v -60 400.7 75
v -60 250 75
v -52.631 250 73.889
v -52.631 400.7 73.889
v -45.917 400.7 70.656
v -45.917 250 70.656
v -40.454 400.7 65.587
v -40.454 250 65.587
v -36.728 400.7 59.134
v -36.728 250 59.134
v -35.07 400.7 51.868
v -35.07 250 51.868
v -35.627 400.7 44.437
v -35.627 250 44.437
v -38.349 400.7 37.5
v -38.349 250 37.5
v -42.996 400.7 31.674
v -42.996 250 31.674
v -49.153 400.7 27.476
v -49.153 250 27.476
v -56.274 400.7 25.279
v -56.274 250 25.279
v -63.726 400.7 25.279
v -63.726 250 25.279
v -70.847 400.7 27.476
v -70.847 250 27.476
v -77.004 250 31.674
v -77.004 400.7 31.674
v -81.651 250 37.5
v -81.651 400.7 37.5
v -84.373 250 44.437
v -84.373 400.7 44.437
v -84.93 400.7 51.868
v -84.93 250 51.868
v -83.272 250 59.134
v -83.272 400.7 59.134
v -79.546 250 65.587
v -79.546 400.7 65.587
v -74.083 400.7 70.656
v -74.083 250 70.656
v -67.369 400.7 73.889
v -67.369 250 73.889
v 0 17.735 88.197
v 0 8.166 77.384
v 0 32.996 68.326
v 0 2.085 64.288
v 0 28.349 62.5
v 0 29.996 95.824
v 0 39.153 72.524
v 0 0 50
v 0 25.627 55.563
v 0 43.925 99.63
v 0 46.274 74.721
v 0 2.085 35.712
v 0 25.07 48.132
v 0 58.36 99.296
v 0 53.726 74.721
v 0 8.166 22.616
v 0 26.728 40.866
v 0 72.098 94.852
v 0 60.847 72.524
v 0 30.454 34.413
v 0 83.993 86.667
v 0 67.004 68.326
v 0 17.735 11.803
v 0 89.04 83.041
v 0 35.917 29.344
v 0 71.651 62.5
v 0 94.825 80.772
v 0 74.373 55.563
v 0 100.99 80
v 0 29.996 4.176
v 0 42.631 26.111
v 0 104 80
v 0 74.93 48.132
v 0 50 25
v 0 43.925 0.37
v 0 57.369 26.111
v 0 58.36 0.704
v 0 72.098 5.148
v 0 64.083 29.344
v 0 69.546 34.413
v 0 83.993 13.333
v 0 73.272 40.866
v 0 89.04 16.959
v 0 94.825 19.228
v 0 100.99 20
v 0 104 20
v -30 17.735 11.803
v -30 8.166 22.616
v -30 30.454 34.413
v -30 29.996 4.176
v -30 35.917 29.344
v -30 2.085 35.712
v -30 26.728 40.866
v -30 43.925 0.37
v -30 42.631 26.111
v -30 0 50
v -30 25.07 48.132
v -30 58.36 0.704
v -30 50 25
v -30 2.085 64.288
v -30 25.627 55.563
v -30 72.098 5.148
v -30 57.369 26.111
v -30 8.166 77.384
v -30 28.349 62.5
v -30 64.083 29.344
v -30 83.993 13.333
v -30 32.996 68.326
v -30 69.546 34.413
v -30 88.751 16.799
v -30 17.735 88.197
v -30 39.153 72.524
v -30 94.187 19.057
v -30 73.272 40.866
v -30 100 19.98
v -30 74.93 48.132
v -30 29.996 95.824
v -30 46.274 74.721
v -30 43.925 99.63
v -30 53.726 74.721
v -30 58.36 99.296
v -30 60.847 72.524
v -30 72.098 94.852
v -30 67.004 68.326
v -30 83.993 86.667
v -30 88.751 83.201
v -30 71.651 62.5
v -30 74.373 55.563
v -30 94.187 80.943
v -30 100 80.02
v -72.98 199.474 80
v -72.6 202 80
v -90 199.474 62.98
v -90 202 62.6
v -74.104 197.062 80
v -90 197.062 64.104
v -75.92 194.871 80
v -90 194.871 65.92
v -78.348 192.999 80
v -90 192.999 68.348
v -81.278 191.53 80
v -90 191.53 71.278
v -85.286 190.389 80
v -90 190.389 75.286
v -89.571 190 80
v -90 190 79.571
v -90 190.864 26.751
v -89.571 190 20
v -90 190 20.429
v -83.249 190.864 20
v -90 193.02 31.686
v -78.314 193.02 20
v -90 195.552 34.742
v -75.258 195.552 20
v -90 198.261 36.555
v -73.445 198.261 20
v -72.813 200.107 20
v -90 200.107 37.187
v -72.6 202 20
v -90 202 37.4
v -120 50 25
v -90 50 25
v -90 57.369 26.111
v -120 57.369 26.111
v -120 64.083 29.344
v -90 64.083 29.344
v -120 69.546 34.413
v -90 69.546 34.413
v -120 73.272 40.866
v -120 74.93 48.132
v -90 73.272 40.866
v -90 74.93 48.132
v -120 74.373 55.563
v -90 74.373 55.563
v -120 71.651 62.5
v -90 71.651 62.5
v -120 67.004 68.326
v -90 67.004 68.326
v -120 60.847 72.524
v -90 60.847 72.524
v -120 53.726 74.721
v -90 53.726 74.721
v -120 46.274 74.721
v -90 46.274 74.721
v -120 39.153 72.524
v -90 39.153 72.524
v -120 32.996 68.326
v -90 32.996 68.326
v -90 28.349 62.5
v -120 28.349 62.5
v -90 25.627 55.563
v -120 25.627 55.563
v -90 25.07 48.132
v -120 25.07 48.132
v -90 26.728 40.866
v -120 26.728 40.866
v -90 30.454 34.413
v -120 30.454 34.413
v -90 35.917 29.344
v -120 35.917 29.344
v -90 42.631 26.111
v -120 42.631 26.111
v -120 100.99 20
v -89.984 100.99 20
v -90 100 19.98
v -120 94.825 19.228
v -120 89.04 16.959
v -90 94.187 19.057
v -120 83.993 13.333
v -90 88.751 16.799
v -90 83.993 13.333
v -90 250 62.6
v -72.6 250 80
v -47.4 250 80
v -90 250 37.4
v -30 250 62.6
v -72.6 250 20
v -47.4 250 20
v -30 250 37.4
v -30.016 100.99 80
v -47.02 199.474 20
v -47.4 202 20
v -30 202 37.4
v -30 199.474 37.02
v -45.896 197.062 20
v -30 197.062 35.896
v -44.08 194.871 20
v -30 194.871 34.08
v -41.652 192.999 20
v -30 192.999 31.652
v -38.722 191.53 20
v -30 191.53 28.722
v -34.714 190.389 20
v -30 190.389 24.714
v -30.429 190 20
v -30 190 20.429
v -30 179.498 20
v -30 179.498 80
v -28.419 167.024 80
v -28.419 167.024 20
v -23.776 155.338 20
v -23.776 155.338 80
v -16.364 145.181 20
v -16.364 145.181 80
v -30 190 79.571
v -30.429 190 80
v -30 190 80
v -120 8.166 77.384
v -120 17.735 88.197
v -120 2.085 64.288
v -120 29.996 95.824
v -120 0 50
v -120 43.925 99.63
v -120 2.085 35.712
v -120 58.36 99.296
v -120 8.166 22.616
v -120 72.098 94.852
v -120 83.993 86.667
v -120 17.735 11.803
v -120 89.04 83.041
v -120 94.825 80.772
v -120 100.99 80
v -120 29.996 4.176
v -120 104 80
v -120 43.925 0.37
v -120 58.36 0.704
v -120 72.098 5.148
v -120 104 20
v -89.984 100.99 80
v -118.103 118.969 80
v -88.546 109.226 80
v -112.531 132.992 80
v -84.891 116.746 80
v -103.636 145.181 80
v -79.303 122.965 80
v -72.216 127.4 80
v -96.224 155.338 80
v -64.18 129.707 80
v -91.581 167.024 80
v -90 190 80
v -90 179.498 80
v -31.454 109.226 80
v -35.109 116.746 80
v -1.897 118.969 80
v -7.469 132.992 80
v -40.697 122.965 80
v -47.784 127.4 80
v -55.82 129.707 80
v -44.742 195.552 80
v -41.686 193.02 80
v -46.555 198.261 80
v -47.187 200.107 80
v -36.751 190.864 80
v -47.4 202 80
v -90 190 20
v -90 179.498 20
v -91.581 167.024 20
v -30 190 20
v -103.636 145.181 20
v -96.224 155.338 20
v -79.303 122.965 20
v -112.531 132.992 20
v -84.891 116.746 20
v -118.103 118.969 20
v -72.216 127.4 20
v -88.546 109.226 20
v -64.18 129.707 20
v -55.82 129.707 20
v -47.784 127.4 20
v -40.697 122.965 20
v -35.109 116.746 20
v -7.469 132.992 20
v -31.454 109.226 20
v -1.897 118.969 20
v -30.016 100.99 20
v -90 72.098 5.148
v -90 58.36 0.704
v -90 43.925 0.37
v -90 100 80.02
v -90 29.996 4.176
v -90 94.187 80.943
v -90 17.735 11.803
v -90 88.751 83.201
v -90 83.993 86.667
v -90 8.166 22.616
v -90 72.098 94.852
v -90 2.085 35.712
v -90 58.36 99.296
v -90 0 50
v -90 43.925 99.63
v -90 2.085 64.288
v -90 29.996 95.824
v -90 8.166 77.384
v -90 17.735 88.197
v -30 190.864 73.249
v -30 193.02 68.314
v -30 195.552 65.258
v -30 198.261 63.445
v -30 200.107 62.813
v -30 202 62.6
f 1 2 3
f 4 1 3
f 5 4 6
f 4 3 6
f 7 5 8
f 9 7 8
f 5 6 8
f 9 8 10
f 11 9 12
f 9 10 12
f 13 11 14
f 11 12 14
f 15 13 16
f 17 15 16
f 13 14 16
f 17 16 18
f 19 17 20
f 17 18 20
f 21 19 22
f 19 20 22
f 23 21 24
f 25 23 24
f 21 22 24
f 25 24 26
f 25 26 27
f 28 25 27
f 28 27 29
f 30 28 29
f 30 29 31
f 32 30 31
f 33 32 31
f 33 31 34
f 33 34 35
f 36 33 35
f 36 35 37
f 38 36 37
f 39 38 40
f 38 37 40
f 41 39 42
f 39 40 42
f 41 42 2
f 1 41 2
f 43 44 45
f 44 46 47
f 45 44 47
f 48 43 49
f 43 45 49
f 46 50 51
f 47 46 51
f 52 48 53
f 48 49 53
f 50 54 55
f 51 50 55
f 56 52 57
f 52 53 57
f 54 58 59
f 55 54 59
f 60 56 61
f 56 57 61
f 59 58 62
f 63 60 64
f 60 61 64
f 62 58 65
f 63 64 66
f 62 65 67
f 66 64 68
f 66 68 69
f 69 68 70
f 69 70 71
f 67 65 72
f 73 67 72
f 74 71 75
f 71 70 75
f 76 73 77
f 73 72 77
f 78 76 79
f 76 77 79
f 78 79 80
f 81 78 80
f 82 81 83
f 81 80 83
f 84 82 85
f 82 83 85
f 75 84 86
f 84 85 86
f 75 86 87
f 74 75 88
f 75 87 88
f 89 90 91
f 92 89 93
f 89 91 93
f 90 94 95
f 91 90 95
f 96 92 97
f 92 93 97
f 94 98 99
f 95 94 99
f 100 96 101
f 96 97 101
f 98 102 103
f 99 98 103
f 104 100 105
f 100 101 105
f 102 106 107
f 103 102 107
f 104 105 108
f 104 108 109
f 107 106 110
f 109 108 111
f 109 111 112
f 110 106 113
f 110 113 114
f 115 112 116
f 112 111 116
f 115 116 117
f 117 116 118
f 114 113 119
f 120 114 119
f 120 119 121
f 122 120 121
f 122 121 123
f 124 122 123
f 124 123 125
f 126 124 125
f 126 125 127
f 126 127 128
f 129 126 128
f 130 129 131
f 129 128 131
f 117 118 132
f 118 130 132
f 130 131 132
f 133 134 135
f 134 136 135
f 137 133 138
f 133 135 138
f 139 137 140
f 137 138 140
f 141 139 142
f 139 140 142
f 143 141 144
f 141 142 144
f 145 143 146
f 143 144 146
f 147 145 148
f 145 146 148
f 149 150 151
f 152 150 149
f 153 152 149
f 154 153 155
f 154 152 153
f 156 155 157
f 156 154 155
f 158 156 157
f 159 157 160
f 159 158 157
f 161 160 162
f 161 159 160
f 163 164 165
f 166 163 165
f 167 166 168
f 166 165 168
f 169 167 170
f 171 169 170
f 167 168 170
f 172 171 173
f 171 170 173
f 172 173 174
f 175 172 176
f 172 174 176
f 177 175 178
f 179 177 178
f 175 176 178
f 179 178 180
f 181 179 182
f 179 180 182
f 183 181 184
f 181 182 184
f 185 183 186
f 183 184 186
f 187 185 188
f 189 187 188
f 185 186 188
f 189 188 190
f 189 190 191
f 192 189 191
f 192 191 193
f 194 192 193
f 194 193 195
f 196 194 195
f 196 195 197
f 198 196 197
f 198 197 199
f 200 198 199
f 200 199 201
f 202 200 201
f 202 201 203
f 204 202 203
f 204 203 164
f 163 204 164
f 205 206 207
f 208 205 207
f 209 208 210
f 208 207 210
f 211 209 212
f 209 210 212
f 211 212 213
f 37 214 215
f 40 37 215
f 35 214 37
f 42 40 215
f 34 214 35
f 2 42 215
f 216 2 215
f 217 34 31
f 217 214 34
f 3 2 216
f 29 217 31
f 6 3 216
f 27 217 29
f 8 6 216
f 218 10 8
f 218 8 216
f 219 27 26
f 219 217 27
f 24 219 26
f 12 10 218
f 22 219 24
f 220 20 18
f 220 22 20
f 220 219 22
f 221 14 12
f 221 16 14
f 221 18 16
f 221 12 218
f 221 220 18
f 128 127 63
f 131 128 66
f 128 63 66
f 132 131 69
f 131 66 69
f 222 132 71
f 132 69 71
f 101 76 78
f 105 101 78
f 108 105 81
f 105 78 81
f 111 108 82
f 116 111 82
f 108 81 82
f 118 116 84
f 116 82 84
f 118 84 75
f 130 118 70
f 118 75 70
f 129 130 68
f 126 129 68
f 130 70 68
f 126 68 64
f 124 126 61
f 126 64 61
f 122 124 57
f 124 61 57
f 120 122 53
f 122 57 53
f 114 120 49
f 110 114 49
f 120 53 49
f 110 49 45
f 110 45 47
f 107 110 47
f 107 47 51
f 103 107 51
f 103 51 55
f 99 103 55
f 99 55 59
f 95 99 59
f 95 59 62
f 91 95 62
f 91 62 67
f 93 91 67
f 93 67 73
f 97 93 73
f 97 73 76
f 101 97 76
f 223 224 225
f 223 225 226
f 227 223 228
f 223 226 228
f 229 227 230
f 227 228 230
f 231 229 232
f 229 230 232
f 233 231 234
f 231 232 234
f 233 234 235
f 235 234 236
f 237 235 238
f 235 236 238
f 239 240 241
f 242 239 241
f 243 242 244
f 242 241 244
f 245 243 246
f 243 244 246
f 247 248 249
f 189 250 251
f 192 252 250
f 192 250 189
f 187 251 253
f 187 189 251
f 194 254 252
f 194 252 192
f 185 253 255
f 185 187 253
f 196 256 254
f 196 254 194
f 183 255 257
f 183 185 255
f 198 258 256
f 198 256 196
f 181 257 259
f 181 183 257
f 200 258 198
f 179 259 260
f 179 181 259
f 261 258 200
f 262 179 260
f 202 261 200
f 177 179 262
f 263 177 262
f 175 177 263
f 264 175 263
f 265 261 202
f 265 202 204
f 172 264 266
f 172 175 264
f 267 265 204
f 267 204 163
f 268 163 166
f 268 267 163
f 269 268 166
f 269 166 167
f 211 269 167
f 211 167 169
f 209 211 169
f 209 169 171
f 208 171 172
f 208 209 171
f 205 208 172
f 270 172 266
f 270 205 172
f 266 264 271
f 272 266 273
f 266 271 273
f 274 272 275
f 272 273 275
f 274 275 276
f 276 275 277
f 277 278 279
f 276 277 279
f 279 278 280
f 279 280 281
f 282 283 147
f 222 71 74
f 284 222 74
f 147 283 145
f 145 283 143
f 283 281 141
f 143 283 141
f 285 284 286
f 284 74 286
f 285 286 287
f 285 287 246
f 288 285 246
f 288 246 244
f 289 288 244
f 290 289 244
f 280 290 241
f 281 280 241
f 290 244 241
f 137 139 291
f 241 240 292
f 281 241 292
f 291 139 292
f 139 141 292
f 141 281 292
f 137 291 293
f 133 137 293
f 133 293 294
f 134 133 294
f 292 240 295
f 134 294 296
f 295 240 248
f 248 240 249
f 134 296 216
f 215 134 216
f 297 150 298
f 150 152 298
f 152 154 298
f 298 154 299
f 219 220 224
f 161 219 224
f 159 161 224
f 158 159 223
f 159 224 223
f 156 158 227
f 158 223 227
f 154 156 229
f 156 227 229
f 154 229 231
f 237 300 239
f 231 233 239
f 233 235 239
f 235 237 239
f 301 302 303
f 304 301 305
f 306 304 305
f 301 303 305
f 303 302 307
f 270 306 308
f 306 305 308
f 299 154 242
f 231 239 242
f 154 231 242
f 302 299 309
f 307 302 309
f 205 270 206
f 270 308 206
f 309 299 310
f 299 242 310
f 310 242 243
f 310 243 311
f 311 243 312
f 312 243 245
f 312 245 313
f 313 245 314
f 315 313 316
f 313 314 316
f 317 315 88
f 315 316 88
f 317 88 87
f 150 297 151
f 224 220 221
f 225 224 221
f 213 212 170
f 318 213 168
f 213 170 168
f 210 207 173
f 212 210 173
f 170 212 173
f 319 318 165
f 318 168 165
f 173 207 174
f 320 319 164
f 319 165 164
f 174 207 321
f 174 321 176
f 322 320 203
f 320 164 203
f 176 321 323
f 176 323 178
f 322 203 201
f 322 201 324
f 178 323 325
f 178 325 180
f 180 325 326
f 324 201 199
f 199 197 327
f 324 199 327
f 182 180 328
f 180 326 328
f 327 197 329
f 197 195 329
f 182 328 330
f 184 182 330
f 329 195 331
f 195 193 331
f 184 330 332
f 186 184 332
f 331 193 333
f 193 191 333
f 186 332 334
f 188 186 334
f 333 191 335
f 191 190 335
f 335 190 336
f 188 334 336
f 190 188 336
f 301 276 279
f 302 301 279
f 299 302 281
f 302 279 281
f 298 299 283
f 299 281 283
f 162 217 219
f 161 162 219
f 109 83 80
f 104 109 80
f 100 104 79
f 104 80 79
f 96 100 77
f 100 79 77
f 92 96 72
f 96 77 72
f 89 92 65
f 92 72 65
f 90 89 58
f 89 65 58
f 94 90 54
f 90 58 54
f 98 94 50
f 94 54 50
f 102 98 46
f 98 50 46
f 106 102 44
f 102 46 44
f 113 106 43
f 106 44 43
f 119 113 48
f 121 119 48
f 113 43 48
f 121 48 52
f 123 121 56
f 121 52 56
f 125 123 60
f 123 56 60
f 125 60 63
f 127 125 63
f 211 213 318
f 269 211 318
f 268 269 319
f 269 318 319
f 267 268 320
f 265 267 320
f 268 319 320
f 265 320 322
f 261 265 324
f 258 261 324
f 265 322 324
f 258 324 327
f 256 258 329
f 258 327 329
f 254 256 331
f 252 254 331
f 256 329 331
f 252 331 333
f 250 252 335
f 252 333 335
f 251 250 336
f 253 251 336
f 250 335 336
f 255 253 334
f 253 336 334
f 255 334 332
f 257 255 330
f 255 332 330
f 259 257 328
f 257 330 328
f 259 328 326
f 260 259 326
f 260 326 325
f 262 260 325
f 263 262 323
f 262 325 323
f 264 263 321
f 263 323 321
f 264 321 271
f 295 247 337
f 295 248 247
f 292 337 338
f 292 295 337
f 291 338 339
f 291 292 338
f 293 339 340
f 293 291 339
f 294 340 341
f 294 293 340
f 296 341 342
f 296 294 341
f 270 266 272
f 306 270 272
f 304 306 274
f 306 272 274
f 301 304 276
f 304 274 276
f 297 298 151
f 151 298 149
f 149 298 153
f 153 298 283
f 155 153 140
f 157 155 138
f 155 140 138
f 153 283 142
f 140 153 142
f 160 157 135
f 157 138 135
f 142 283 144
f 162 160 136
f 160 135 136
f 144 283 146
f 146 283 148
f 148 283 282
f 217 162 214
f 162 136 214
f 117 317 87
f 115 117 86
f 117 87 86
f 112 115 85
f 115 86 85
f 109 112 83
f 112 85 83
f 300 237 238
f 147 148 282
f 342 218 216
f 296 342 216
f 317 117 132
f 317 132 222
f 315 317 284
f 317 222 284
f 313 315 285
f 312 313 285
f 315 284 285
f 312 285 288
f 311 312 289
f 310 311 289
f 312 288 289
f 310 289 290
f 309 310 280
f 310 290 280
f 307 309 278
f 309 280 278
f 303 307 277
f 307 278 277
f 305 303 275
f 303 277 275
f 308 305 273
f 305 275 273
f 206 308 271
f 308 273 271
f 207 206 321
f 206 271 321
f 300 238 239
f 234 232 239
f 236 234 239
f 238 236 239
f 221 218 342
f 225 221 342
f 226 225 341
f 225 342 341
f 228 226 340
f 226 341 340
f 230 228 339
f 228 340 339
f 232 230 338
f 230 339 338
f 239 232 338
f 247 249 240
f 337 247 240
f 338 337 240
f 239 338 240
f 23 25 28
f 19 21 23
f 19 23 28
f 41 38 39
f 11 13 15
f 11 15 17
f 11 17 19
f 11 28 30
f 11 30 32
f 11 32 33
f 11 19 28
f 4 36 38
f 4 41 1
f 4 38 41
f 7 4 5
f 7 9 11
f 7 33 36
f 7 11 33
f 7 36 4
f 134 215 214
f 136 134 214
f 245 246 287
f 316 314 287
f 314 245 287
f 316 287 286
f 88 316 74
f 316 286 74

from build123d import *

# Parameters (mm, degrees)
SKETCH1_W           = 120
SKETCH1_H           = 250
BOSS_EXTRUDE1_DEPTH = 100
CUT_EXTRUDE1_DEPTH  = 295.78805946
SKETCH3_R           = 25
CUT_EXTRUDE2_DEPTH  = 295.78805946
CUT_EXTRUDE3_DEPTH  = 60
SKETCH4_3_R         = 25
BOSS_EXTRUDE2_DEPTH = 150.7
FILLET2_R           = 12


with BuildPart() as part:
    # Sketch1 → Boss-Extrude1 (new body)
    with BuildSketch(Plane.XY):
        with Locations((-60, 125)):
            Rectangle(SKETCH1_W, SKETCH1_H)
    extrude(amount=BOSS_EXTRUDE1_DEPTH)

    # Sketch2 → Cut-Extrude1 (cut, through all)
    with BuildSketch(Plane.XY.offset(100)):
        with BuildLine():
            Line((-90, 179.498344353), (-90, 250))
            Line((-90, 250), (-120, 250))
            Line((-120, 250), (-120, 104))
            ThreePointArc((-120, 104), (-115.759222637, 126.156468376), (-103.636363636, 145.180915101))
            ThreePointArc((-103.636363636, 145.180915101), (-93.533981136, 161.034620706), (-90, 179.498344353))
        make_face()
        with BuildLine():
            Line((0, 250), (-30, 250))
            Line((-30, 250), (-30, 179.498344353))
            ThreePointArc((-30, 179.498344353), (-26.466018864, 161.034620706), (-16.363636364, 145.180915101))
            ThreePointArc((-16.363636364, 145.180915101), (-4.240777331, 126.156468297), (0, 103.999999829))
            Line((0, 103.999999829), (0, 250))
        make_face()
        with BuildLine():
            Line((-30, 0), (-30, 100))
            ThreePointArc((-30, 100), (-60, 130), (-90, 100))
            Line((-90, 100), (-90, 0))
            Line((-90, 0), (-30, 0))
        make_face()
    extrude(amount=-CUT_EXTRUDE1_DEPTH, mode=Mode.SUBTRACT)

    # Sketch3 → Cut-Extrude2 (cut, through all)
    with BuildSketch(Plane(origin=(0, 0, 0), x_dir=(0, 0, -1), z_dir=(1, 0, 0))):
        with BuildLine():
            ThreePointArc((-86.666666667, 83.993463424), (-81.726266594, 91.861485844), (-80, 100.990195136))
            Line((-80, 100.990195136), (-80, 250))
            Line((-80, 250), (-100, 250))
            Line((-100, 250), (-100, 50))
            ThreePointArc((-100, 50), (-96.547466813, 68.257418584), (-86.666666667, 83.993463424))
        make_face()
        with BuildLine():
            Line((0, 50.000000014), (0, 250))
            Line((0, 250), (-20, 250))
            Line((-20, 250), (-20, 100.990195136))
            ThreePointArc((-20, 100.990195136), (-18.273733406, 91.861485844), (-13.333333333, 83.993463424))
            ThreePointArc((-13.333333333, 83.993463424), (-3.45253319, 68.25741859), (0, 50.000000014))
        make_face()
        with BuildLine():
            ThreePointArc((-50, 0), (-85.355339059, 14.644660941), (-100, 50))
            Line((-100, 50), (-100, 0))
            Line((-100, 0), (-50, 0))
        make_face()
        with BuildLine():
            ThreePointArc((0, 50.000000014), (-14.644660936, 14.644660946), (-50, 0))
            Line((-50, 0), (0, 0))
            Line((0, 0), (0, 50.000000014))
        make_face()
        with Locations((-50, 50)):
            Circle(SKETCH3_R)
    extrude(amount=-CUT_EXTRUDE2_DEPTH, mode=Mode.SUBTRACT)

    # Sketch4 → Cut-Extrude3 (cut)
    with BuildSketch(Plane(origin=(0, 250, 0), x_dir=(1, 0, 0), z_dir=(0, 1, 0))):
        Polygon((-90, -62.6), (-90, -80), (-72.6, -80), align=None)
        Polygon((-30, -62.6), (-47.4, -80), (-30, -80), align=None)
        Polygon((-90, -20), (-90, -37.4), (-72.6, -20), align=None)
        Polygon((-47.4, -20), (-30, -37.4), (-30, -20), align=None)
    extrude(amount=-CUT_EXTRUDE3_DEPTH, mode=Mode.SUBTRACT)

    # Sketch4<3> → Boss-Extrude2 (add)
    with BuildSketch(Plane(origin=(0, 250, 0), x_dir=(1, 0, 0), z_dir=(0, 1, 0))):
        with Locations((-60, -50)):
            Circle(SKETCH4_3_R)
    extrude(amount=BOSS_EXTRUDE2_DEPTH)

    # Fillet2
    fillet2_edges = [part.edges().sort_by_distance(p)[0] for p in [
        (-81.3, 190, 71.3),
        (-38.7, 190, 71.3),
        (-38.7, 190, 28.7),
        (-81.3, 190, 28.7),
    ]]
    fillet(fillet2_edges, radius=FILLET2_R)


solid = part.part
